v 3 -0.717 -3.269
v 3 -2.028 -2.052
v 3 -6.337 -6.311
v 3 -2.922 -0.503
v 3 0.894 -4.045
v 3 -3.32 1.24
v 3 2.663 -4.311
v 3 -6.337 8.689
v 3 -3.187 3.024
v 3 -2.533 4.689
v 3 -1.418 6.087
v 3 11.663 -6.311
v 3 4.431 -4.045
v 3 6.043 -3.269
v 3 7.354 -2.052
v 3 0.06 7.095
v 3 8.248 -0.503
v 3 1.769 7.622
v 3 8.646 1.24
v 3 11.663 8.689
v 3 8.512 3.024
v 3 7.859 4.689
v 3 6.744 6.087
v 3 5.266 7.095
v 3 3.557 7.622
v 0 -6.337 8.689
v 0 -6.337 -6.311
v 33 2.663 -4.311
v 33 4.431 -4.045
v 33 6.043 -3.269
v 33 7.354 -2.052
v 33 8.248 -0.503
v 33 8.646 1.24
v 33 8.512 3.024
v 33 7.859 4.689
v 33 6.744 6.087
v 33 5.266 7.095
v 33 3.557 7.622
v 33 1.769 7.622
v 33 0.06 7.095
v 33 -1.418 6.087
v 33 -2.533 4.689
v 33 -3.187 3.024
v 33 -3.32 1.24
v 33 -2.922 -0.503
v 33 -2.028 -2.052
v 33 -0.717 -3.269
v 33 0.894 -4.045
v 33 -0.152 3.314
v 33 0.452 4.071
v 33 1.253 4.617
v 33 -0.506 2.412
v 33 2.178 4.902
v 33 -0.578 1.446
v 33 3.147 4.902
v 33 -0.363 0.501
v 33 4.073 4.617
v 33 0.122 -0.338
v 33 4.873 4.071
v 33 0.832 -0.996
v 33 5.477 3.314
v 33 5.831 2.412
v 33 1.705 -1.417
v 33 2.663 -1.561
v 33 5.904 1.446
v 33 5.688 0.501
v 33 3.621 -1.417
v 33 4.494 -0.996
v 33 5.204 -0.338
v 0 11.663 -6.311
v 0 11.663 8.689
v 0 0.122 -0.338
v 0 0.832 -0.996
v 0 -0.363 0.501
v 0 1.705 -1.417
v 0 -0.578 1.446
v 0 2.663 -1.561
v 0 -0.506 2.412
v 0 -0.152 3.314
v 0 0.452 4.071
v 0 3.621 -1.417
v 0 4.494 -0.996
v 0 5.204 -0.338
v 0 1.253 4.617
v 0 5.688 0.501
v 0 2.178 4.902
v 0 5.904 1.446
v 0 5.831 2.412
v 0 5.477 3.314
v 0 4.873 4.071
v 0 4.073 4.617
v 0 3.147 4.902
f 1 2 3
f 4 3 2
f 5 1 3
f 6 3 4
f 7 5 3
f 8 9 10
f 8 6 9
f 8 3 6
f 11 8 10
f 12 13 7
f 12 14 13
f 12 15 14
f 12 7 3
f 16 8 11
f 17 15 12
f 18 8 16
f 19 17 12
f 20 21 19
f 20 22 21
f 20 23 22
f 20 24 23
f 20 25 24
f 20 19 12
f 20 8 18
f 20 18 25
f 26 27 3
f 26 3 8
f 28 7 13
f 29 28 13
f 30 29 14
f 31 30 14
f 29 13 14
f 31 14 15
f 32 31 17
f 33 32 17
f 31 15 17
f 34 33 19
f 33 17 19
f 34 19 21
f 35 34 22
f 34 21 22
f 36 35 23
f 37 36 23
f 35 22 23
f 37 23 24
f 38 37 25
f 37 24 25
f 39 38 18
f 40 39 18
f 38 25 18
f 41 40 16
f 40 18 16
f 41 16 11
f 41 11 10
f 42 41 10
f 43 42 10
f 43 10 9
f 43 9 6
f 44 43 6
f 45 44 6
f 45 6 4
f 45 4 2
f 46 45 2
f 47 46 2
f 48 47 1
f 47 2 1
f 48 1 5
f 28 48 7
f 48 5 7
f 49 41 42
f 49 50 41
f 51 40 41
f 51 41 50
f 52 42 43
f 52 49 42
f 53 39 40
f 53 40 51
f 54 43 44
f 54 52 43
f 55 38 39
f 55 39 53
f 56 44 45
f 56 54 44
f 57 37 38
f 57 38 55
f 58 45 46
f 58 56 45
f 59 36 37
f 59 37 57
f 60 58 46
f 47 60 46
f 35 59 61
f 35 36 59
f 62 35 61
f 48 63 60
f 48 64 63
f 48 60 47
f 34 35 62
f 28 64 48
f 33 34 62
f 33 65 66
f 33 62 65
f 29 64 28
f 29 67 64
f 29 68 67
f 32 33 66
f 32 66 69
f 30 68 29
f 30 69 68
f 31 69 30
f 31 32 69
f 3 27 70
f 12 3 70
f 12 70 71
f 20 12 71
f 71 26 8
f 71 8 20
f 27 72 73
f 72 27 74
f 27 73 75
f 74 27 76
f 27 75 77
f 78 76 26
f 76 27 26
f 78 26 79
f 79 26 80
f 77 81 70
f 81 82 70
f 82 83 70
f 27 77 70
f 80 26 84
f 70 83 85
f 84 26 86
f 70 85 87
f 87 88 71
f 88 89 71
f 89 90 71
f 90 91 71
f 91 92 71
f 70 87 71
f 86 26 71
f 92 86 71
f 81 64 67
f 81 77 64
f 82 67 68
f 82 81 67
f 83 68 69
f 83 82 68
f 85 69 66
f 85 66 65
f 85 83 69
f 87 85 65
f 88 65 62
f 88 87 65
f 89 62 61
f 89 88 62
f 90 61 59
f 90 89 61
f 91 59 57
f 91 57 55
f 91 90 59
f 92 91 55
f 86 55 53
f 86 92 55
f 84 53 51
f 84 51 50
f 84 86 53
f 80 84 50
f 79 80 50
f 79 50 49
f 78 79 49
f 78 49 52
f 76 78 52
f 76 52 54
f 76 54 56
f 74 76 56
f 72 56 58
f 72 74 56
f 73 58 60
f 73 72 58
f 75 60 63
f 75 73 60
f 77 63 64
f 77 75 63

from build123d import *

# Parameters (mm, degrees)
SKETCH1_W           = 18
SKETCH1_H           = 15
SKETCH1_R           = 3.25
BOSS_EXTRUDE1_DEPTH = 3
SKETCH2_R           = 6
SKETCH2_R_2         = 3.25
BOSS_EXTRUDE2_DEPTH = 30


with BuildPart() as part:
    # Sketch1 → Boss-Extrude1 (new body)
    with BuildSketch(Plane.YZ):
        with Locations((2.662827036, 1.188789176)):
            Rectangle(SKETCH1_W, SKETCH1_H)
        with Locations(Location((2.662827036, 1.688789176, 0), (0, 0, 270))):
            Circle(SKETCH1_R, mode=Mode.SUBTRACT)
    extrude(amount=BOSS_EXTRUDE1_DEPTH)

    # Sketch2 → Boss-Extrude2 (add)
    with BuildSketch(Plane.YZ.offset(3)):
        with Locations(Location((2.662827036, 1.688789176, 0), (0, 0, 270))):
            Circle(SKETCH2_R)
        with Locations(Location((2.662827036, 1.688789176, 0), (0, 0, 270))):
            Circle(SKETCH2_R_2, mode=Mode.SUBTRACT)
    extrude(amount=BOSS_EXTRUDE2_DEPTH)


solid = part.part
